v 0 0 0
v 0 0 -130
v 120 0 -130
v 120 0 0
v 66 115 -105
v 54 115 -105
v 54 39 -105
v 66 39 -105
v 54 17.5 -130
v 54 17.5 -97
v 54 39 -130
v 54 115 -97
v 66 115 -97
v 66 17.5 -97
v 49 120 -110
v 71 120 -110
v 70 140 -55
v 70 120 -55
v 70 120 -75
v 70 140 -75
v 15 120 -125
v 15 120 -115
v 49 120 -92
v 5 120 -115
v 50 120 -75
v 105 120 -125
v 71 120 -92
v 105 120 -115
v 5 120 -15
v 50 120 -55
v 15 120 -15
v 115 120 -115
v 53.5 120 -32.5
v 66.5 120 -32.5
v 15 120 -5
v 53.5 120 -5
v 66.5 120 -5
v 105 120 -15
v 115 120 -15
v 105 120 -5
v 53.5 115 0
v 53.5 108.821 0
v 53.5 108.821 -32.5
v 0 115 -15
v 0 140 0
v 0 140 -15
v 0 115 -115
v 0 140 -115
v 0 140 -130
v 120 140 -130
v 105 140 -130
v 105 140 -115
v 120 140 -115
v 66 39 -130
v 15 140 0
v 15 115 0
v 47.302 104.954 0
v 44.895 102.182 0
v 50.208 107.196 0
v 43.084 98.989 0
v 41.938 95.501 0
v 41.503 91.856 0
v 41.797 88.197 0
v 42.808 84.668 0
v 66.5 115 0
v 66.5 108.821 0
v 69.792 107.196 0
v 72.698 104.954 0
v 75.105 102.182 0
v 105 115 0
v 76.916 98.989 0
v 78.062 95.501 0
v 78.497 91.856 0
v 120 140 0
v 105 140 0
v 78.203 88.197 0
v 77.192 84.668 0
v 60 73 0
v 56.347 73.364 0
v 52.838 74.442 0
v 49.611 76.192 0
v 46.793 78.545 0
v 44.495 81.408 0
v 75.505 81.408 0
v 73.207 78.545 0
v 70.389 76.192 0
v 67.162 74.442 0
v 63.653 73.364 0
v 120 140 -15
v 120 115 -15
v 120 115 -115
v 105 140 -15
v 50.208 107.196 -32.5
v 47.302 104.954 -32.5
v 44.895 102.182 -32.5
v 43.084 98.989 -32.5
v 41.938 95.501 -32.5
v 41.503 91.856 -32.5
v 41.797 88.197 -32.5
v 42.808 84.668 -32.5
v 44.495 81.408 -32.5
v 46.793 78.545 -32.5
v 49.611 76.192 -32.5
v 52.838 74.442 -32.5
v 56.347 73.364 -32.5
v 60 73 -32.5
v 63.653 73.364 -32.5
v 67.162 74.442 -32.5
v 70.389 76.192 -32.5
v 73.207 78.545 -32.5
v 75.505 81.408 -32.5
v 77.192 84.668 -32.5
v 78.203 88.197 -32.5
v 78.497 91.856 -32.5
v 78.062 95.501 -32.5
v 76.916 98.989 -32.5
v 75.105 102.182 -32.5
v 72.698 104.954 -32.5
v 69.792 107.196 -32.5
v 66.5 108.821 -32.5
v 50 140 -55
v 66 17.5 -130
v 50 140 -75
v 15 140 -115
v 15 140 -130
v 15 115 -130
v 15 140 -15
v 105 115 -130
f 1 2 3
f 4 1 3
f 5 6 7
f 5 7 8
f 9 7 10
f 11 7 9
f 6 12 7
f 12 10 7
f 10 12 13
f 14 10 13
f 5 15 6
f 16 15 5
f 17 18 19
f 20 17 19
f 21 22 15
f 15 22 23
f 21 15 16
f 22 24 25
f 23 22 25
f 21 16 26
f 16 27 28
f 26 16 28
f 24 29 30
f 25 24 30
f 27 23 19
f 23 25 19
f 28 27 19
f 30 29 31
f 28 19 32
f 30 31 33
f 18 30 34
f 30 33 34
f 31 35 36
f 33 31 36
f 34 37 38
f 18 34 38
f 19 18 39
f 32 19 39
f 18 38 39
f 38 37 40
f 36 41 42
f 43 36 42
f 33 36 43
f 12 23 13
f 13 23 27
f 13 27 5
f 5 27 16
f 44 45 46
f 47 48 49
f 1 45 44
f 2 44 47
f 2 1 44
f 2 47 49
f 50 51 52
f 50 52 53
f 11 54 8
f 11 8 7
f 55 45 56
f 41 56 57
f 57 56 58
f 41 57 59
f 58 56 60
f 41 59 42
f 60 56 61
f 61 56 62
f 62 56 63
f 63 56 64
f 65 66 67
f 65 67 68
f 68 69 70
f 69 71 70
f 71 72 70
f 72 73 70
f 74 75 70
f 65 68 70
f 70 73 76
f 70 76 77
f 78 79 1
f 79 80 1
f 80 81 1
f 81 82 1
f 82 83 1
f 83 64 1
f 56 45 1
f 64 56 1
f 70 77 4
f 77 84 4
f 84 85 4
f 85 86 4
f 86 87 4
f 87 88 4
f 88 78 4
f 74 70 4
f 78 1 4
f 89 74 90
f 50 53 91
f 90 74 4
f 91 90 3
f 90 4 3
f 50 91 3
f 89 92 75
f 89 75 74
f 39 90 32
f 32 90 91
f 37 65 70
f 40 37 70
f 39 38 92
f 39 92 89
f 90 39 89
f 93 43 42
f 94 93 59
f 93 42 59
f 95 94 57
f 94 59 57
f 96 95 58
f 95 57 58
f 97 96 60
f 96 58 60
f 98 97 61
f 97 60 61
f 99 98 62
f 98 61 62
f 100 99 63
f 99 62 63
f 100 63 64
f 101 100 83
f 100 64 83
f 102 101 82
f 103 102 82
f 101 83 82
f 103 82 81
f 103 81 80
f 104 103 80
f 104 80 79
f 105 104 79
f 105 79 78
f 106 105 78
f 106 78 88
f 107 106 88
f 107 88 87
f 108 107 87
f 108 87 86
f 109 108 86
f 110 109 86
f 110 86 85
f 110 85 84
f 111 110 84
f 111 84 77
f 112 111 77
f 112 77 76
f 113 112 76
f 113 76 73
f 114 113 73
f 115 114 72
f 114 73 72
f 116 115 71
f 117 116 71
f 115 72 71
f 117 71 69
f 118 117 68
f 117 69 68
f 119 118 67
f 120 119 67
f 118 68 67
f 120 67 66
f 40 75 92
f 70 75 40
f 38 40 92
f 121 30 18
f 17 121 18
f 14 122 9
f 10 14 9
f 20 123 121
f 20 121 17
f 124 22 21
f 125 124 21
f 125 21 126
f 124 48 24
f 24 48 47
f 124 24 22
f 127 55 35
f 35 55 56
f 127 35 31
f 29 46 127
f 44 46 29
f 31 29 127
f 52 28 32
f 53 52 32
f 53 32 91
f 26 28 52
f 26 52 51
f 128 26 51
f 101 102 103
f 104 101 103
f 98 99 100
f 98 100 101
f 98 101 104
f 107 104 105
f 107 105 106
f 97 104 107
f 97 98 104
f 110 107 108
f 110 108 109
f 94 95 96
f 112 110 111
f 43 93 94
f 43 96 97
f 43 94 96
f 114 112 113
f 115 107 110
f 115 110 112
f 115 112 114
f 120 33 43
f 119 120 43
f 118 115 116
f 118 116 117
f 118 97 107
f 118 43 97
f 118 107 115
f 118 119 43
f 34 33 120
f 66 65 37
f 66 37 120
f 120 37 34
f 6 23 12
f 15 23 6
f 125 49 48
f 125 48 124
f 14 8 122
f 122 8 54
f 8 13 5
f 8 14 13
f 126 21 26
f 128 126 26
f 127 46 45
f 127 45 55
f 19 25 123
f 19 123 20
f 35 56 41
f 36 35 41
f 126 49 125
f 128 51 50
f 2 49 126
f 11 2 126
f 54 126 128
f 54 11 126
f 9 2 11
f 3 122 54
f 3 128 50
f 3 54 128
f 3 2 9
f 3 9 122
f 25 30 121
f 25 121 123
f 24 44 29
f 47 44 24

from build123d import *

# Parameters (mm, degrees)
SKETCH1_W           = 120
SKETCH1_H           = 120
BOSS_EXTRUDE2_DEPTH = 130
SKETCH20_W          = 12
SKETCH20_H          = 21.5
CUT_EXTRUDE3_DEPTH  = 33
SKETCH10_W          = 12
SKETCH10_H          = 8
CUT_EXTRUDE4_DEPTH  = 91
SKETCH2_R           = 18.5
CUT_EXTRUDE5_DEPTH  = 32.5
SKETCH24_W          = 15
SKETCH24_H          = 15
BOSS_EXTRUDE4_DEPTH = 20
SKETCH16_W          = 20
SKETCH16_H          = 20
BOSS_EXTRUDE5_DEPTH = 20
SKETCH27_W          = 15
SKETCH27_H          = 15
BOSS_EXTRUDE6_DEPTH = 20
SKETCH28_W          = 15
SKETCH28_H          = 15
BOSS_EXTRUDE7_DEPTH = 20
SKETCH29_W          = 15
SKETCH29_H          = 15
BOSS_EXTRUDE8_DEPTH = 20
CHAMFER3_SIZE       = 5
SKETCH38_W          = 13
SKETCH38_H          = 32.5
CUT_EXTRUDE7_DEPTH  = 30
CHAMFER4_SIZE       = 5


with BuildPart() as part:
    # Sketch1 → Boss-Extrude2 (new body)
    with BuildSketch(Plane.XY):
        with Locations((60, 60)):
            Rectangle(SKETCH1_W, SKETCH1_H)
    extrude(amount=-BOSS_EXTRUDE2_DEPTH)

    # Sketch20 → Cut-Extrude3 (cut)
    with BuildSketch(Plane(origin=(0, 0, -130), x_dir=(-1, 0, 0), z_dir=(0, 0, -1))):
        with Locations((-60, 28.25)):
            Rectangle(SKETCH20_W, SKETCH20_H)
    extrude(amount=-CUT_EXTRUDE3_DEPTH, mode=Mode.SUBTRACT)

    # Sketch10 → Cut-Extrude4 (cut)
    with BuildSketch(Plane(origin=(0, 120, 0), x_dir=(1, 0, 0), z_dir=(0, 1, 0))):
        with Locations((60, 101)):
            Rectangle(SKETCH10_W, SKETCH10_H)
    extrude(amount=-CUT_EXTRUDE4_DEPTH, mode=Mode.SUBTRACT)

    # Sketch2 → Cut-Extrude5 (cut)
    with BuildSketch(Plane.XY):
        with Locations((60, 91.5)):
            Circle(SKETCH2_R)
    extrude(amount=-CUT_EXTRUDE5_DEPTH, mode=Mode.SUBTRACT)

    # Sketch24 → Boss-Extrude4 (add)
    with BuildSketch(Plane(origin=(0, 120, 0), x_dir=(1, 0, 0), z_dir=(0, 1, 0))):
        with Locations((7.5, 122.5)):
            Rectangle(SKETCH24_W, SKETCH24_H)
    extrude(amount=BOSS_EXTRUDE4_DEPTH)

    # Sketch16 → Boss-Extrude5 (add)
    with BuildSketch(Plane(origin=(0, 120, 0), x_dir=(1, 0, 0), z_dir=(0, 1, 0))):
        with Locations((60, 65)):
            Rectangle(SKETCH16_W, SKETCH16_H)
    extrude(amount=BOSS_EXTRUDE5_DEPTH)

    # Sketch27 → Boss-Extrude6 (add)
    with BuildSketch(Plane(origin=(0, 120, 0), x_dir=(1, 0, 0), z_dir=(0, 1, 0))):
        with Locations((7.5, 7.5)):
            Rectangle(SKETCH27_W, SKETCH27_H)
    extrude(amount=BOSS_EXTRUDE6_DEPTH)

    # Sketch28 → Boss-Extrude7 (add)
    with BuildSketch(Plane(origin=(0, 120, 0), x_dir=(1, 0, 0), z_dir=(0, 1, 0))):
        with Locations((112.5, 122.5)):
            Rectangle(SKETCH28_W, SKETCH28_H)
    extrude(amount=BOSS_EXTRUDE7_DEPTH)

    # Sketch29 → Boss-Extrude8 (add)
    with BuildSketch(Plane(origin=(0, 120, 0), x_dir=(1, 0, 0), z_dir=(0, 1, 0))):
        with Locations((112.5, 7.5)):
            Rectangle(SKETCH29_W, SKETCH29_H)
    extrude(amount=BOSS_EXTRUDE8_DEPTH)

    # Chamfer3
    chamfer3_edges = [part.edges().sort_by_distance(p)[0] for p in [
        (60, 120, -105),
        (66, 120, -101),
        (54, 120, -101),
        (60, 120, -97),
    ]]
    chamfer(chamfer3_edges, length=CHAMFER3_SIZE)

    # Sketch38 → Cut-Extrude7 (cut)
    with BuildSketch(Plane(origin=(0, 120, 0), x_dir=(1, 0, 0), z_dir=(0, 1, 0))):
        with Locations((60, 16.25)):
            Rectangle(SKETCH38_W, SKETCH38_H)
    extrude(amount=-CUT_EXTRUDE7_DEPTH, mode=Mode.SUBTRACT)

    # Chamfer4
    chamfer4_edges = [part.edges().sort_by_distance(p)[0] for p in [
        (120, 120, -65),
        (85.75, 120, 0),
        (60, 120, -130),
        (0, 120, -65),
        (34.25, 120, 0),
    ]]
    chamfer(chamfer4_edges, length=CHAMFER4_SIZE)


solid = part.part
